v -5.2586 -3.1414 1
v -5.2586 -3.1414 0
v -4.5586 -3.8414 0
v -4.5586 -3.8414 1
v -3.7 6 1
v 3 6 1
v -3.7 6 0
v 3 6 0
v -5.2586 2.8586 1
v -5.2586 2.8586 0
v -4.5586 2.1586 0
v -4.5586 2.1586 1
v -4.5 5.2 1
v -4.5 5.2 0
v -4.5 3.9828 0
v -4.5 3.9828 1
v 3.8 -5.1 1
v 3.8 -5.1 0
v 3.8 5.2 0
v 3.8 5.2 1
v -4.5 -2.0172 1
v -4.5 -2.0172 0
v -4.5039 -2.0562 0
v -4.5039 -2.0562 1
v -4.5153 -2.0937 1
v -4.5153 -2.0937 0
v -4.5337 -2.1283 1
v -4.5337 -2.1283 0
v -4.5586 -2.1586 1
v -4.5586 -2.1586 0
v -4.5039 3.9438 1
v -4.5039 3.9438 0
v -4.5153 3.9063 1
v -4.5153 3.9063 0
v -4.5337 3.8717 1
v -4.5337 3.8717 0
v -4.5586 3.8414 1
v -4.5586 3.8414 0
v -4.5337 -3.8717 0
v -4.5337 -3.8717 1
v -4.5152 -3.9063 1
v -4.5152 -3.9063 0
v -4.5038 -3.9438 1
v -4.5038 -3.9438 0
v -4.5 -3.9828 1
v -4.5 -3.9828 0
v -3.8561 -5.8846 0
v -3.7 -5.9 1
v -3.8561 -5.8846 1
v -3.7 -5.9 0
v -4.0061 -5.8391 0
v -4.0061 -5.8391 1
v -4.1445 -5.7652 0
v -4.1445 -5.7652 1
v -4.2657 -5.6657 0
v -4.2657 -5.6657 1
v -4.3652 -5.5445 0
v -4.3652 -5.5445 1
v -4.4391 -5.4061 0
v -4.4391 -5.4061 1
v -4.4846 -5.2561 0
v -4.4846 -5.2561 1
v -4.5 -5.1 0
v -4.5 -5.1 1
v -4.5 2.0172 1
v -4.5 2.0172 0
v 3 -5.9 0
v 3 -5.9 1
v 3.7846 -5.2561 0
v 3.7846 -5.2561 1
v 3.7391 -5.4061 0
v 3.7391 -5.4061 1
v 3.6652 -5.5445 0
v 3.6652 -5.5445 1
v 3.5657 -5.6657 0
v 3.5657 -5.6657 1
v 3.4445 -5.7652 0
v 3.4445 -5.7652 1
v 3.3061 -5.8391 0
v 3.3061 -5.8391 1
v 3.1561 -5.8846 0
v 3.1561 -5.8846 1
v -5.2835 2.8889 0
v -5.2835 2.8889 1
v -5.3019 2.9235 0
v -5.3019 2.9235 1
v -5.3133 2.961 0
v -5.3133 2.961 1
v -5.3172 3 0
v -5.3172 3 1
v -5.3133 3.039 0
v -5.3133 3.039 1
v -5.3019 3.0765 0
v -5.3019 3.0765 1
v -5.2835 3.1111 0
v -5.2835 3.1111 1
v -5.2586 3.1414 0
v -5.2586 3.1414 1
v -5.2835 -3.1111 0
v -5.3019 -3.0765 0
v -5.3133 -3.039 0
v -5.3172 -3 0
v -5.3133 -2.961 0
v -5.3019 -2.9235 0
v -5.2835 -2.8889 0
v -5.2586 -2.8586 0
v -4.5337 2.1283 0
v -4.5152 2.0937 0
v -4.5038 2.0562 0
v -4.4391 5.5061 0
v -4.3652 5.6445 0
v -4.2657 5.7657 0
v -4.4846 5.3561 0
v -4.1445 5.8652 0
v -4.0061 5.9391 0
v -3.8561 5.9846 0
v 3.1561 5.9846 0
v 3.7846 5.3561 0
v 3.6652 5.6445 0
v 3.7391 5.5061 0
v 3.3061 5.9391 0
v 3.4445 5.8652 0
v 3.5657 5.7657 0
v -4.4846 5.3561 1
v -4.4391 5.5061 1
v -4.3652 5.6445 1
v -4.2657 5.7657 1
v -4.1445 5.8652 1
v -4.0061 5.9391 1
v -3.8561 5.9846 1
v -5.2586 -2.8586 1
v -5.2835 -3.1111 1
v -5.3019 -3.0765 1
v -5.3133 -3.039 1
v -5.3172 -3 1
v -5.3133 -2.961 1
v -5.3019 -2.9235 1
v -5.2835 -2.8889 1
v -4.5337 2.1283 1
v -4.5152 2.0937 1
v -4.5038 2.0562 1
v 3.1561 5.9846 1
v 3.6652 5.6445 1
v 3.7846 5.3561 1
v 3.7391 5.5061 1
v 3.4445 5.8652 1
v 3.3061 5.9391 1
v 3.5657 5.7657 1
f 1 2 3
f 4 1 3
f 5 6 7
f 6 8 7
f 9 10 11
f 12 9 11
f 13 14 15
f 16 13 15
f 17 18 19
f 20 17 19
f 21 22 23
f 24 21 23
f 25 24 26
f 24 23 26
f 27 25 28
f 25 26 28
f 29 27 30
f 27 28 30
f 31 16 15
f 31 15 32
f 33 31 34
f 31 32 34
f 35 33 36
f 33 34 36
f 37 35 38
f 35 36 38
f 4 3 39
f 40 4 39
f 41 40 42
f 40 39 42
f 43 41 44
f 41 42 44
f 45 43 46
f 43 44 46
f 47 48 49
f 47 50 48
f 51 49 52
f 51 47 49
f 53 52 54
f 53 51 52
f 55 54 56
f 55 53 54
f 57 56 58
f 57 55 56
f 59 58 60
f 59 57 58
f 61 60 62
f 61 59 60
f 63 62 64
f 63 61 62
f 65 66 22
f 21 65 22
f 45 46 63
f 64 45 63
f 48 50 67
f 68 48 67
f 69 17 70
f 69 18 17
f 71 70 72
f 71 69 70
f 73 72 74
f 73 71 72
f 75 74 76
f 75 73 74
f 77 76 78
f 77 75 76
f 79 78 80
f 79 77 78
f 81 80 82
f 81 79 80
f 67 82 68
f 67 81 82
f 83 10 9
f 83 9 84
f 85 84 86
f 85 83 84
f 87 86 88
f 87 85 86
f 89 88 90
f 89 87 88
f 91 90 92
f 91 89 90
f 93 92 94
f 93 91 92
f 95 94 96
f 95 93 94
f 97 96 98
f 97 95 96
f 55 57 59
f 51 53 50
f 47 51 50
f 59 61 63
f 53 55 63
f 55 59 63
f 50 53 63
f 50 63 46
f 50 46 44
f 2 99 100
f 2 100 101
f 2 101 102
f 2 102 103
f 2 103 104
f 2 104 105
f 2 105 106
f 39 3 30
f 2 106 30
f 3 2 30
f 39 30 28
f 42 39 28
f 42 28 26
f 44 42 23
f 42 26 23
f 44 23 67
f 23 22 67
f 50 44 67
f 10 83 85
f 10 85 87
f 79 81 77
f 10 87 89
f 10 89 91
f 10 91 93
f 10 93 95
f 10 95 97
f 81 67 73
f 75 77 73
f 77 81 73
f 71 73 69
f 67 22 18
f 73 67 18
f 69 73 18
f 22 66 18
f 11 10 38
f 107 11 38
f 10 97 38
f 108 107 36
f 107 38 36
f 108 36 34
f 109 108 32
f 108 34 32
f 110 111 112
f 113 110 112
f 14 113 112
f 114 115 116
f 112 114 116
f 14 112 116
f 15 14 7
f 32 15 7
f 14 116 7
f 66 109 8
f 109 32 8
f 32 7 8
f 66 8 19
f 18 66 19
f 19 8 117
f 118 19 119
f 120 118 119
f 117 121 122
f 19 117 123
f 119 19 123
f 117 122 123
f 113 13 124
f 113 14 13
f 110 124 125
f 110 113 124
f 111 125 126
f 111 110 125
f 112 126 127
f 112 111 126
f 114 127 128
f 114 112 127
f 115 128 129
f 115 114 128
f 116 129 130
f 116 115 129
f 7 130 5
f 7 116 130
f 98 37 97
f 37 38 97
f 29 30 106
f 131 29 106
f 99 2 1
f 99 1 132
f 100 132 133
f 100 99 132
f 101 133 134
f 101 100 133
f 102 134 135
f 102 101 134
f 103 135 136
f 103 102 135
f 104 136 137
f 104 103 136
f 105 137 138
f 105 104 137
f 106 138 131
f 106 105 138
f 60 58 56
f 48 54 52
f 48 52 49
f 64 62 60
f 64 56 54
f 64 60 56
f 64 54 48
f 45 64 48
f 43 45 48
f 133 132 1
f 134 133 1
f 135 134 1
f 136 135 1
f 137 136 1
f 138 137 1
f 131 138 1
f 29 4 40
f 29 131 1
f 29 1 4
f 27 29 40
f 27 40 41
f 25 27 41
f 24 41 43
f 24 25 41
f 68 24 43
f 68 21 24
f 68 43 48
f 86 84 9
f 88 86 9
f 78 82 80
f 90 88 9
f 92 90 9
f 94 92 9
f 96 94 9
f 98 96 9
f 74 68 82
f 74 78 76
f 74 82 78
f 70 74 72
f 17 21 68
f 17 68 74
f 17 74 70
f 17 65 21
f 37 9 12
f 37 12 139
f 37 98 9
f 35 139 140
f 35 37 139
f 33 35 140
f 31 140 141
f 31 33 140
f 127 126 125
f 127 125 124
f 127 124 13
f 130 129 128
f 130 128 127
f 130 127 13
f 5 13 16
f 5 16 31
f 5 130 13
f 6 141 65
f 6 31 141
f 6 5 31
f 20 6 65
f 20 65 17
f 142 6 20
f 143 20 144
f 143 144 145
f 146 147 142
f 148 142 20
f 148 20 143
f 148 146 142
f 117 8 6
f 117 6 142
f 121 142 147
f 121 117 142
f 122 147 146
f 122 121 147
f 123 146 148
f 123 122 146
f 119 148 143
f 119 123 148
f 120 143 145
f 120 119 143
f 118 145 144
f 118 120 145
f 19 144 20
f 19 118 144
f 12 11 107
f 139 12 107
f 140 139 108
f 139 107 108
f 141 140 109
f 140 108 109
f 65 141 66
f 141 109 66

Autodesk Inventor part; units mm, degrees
sketch "Sketch_1" plane through (0, 0, 0) normal (0, 0, 1) x (1, 0, 0)
  arc A0 (-5.2586, 3.1414) -> (-5.2586, 2.8586) centre (-5.1172, 3) ccw
  line L0 (-5.2586, 2.8586) -> (-4.5586, 2.1586)
  arc A1 (-4.5, 2.0172) -> (-4.5586, 2.1586) centre (-4.7, 2.0172) ccw
  line L1 (-4.5, 2.0172) -> (-4.5, -2.0172)
  arc A2 (-4.5586, -2.1586) -> (-4.5, -2.0172) centre (-4.7, -2.0172) ccw
  line L2 (-4.5586, -2.1586) -> (-5.2586, -2.8586)
  arc A3 (-5.2586, -2.8586) -> (-5.2586, -3.1414) centre (-5.1172, -3) ccw
  line L3 (-5.2586, -3.1414) -> (-4.5586, -3.8414)
  arc A4 (-4.5, -3.9828) -> (-4.5586, -3.8414) centre (-4.7, -3.9828) ccw
  line L4 (-4.5, -3.9828) -> (-4.5, -5.1)
  arc A5 (-4.5, -5.1) -> (-3.7, -5.9) centre (-3.7, -5.1) ccw
  line L5 (-3.7, -5.9) -> (3, -5.9)
  arc A6 (3, -5.9) -> (3.8, -5.1) centre (3, -5.1) ccw
  line L6 (3.8, -5.1) -> (3.8, 5.2)
  arc A7 (3.8, 5.2) -> (3, 6) centre (3, 5.2) ccw
  line L7 (3, 6) -> (-3.7, 6)
  arc A8 (-3.7, 6) -> (-4.5, 5.2) centre (-3.7, 5.2) ccw
  line L8 (-4.5, 5.2) -> (-4.5, 3.9828)
  arc A9 (-4.5586, 3.8414) -> (-4.5, 3.9828) centre (-4.7, 3.9828) ccw
  line L9 (-4.5586, 3.8414) -> (-5.2586, 3.1414)
extrude "Extrusion1" add sketch "Sketch_1" along normal blind 1
ref_plane "hal_XY" through (0, 0, 0) normal (0, 0, 1) x (1, 0, 0)
ref_plane "hal_YZ" through (0, 0, 0) normal (1, 0, 0) x (0, 1, 0)
ref_plane "hal_ZX" through (0, 0, 0) normal (0, 1, 0) x (0, 0, 1)
ref_plane "s01_XY" through (0, 0, 1) normal (0, 0, 1) x (1, 0, 0)
ref_plane "s01_YZ" through (0, 0, 1) normal (1, 0, 0) x (0, 1, 0)
ref_plane "s01_ZX" through (0, 0, 1) normal (0, 1, 0) x (0, 0, 1)
properties part number "SCHUNK-9962713 Bracket MPG 40"
